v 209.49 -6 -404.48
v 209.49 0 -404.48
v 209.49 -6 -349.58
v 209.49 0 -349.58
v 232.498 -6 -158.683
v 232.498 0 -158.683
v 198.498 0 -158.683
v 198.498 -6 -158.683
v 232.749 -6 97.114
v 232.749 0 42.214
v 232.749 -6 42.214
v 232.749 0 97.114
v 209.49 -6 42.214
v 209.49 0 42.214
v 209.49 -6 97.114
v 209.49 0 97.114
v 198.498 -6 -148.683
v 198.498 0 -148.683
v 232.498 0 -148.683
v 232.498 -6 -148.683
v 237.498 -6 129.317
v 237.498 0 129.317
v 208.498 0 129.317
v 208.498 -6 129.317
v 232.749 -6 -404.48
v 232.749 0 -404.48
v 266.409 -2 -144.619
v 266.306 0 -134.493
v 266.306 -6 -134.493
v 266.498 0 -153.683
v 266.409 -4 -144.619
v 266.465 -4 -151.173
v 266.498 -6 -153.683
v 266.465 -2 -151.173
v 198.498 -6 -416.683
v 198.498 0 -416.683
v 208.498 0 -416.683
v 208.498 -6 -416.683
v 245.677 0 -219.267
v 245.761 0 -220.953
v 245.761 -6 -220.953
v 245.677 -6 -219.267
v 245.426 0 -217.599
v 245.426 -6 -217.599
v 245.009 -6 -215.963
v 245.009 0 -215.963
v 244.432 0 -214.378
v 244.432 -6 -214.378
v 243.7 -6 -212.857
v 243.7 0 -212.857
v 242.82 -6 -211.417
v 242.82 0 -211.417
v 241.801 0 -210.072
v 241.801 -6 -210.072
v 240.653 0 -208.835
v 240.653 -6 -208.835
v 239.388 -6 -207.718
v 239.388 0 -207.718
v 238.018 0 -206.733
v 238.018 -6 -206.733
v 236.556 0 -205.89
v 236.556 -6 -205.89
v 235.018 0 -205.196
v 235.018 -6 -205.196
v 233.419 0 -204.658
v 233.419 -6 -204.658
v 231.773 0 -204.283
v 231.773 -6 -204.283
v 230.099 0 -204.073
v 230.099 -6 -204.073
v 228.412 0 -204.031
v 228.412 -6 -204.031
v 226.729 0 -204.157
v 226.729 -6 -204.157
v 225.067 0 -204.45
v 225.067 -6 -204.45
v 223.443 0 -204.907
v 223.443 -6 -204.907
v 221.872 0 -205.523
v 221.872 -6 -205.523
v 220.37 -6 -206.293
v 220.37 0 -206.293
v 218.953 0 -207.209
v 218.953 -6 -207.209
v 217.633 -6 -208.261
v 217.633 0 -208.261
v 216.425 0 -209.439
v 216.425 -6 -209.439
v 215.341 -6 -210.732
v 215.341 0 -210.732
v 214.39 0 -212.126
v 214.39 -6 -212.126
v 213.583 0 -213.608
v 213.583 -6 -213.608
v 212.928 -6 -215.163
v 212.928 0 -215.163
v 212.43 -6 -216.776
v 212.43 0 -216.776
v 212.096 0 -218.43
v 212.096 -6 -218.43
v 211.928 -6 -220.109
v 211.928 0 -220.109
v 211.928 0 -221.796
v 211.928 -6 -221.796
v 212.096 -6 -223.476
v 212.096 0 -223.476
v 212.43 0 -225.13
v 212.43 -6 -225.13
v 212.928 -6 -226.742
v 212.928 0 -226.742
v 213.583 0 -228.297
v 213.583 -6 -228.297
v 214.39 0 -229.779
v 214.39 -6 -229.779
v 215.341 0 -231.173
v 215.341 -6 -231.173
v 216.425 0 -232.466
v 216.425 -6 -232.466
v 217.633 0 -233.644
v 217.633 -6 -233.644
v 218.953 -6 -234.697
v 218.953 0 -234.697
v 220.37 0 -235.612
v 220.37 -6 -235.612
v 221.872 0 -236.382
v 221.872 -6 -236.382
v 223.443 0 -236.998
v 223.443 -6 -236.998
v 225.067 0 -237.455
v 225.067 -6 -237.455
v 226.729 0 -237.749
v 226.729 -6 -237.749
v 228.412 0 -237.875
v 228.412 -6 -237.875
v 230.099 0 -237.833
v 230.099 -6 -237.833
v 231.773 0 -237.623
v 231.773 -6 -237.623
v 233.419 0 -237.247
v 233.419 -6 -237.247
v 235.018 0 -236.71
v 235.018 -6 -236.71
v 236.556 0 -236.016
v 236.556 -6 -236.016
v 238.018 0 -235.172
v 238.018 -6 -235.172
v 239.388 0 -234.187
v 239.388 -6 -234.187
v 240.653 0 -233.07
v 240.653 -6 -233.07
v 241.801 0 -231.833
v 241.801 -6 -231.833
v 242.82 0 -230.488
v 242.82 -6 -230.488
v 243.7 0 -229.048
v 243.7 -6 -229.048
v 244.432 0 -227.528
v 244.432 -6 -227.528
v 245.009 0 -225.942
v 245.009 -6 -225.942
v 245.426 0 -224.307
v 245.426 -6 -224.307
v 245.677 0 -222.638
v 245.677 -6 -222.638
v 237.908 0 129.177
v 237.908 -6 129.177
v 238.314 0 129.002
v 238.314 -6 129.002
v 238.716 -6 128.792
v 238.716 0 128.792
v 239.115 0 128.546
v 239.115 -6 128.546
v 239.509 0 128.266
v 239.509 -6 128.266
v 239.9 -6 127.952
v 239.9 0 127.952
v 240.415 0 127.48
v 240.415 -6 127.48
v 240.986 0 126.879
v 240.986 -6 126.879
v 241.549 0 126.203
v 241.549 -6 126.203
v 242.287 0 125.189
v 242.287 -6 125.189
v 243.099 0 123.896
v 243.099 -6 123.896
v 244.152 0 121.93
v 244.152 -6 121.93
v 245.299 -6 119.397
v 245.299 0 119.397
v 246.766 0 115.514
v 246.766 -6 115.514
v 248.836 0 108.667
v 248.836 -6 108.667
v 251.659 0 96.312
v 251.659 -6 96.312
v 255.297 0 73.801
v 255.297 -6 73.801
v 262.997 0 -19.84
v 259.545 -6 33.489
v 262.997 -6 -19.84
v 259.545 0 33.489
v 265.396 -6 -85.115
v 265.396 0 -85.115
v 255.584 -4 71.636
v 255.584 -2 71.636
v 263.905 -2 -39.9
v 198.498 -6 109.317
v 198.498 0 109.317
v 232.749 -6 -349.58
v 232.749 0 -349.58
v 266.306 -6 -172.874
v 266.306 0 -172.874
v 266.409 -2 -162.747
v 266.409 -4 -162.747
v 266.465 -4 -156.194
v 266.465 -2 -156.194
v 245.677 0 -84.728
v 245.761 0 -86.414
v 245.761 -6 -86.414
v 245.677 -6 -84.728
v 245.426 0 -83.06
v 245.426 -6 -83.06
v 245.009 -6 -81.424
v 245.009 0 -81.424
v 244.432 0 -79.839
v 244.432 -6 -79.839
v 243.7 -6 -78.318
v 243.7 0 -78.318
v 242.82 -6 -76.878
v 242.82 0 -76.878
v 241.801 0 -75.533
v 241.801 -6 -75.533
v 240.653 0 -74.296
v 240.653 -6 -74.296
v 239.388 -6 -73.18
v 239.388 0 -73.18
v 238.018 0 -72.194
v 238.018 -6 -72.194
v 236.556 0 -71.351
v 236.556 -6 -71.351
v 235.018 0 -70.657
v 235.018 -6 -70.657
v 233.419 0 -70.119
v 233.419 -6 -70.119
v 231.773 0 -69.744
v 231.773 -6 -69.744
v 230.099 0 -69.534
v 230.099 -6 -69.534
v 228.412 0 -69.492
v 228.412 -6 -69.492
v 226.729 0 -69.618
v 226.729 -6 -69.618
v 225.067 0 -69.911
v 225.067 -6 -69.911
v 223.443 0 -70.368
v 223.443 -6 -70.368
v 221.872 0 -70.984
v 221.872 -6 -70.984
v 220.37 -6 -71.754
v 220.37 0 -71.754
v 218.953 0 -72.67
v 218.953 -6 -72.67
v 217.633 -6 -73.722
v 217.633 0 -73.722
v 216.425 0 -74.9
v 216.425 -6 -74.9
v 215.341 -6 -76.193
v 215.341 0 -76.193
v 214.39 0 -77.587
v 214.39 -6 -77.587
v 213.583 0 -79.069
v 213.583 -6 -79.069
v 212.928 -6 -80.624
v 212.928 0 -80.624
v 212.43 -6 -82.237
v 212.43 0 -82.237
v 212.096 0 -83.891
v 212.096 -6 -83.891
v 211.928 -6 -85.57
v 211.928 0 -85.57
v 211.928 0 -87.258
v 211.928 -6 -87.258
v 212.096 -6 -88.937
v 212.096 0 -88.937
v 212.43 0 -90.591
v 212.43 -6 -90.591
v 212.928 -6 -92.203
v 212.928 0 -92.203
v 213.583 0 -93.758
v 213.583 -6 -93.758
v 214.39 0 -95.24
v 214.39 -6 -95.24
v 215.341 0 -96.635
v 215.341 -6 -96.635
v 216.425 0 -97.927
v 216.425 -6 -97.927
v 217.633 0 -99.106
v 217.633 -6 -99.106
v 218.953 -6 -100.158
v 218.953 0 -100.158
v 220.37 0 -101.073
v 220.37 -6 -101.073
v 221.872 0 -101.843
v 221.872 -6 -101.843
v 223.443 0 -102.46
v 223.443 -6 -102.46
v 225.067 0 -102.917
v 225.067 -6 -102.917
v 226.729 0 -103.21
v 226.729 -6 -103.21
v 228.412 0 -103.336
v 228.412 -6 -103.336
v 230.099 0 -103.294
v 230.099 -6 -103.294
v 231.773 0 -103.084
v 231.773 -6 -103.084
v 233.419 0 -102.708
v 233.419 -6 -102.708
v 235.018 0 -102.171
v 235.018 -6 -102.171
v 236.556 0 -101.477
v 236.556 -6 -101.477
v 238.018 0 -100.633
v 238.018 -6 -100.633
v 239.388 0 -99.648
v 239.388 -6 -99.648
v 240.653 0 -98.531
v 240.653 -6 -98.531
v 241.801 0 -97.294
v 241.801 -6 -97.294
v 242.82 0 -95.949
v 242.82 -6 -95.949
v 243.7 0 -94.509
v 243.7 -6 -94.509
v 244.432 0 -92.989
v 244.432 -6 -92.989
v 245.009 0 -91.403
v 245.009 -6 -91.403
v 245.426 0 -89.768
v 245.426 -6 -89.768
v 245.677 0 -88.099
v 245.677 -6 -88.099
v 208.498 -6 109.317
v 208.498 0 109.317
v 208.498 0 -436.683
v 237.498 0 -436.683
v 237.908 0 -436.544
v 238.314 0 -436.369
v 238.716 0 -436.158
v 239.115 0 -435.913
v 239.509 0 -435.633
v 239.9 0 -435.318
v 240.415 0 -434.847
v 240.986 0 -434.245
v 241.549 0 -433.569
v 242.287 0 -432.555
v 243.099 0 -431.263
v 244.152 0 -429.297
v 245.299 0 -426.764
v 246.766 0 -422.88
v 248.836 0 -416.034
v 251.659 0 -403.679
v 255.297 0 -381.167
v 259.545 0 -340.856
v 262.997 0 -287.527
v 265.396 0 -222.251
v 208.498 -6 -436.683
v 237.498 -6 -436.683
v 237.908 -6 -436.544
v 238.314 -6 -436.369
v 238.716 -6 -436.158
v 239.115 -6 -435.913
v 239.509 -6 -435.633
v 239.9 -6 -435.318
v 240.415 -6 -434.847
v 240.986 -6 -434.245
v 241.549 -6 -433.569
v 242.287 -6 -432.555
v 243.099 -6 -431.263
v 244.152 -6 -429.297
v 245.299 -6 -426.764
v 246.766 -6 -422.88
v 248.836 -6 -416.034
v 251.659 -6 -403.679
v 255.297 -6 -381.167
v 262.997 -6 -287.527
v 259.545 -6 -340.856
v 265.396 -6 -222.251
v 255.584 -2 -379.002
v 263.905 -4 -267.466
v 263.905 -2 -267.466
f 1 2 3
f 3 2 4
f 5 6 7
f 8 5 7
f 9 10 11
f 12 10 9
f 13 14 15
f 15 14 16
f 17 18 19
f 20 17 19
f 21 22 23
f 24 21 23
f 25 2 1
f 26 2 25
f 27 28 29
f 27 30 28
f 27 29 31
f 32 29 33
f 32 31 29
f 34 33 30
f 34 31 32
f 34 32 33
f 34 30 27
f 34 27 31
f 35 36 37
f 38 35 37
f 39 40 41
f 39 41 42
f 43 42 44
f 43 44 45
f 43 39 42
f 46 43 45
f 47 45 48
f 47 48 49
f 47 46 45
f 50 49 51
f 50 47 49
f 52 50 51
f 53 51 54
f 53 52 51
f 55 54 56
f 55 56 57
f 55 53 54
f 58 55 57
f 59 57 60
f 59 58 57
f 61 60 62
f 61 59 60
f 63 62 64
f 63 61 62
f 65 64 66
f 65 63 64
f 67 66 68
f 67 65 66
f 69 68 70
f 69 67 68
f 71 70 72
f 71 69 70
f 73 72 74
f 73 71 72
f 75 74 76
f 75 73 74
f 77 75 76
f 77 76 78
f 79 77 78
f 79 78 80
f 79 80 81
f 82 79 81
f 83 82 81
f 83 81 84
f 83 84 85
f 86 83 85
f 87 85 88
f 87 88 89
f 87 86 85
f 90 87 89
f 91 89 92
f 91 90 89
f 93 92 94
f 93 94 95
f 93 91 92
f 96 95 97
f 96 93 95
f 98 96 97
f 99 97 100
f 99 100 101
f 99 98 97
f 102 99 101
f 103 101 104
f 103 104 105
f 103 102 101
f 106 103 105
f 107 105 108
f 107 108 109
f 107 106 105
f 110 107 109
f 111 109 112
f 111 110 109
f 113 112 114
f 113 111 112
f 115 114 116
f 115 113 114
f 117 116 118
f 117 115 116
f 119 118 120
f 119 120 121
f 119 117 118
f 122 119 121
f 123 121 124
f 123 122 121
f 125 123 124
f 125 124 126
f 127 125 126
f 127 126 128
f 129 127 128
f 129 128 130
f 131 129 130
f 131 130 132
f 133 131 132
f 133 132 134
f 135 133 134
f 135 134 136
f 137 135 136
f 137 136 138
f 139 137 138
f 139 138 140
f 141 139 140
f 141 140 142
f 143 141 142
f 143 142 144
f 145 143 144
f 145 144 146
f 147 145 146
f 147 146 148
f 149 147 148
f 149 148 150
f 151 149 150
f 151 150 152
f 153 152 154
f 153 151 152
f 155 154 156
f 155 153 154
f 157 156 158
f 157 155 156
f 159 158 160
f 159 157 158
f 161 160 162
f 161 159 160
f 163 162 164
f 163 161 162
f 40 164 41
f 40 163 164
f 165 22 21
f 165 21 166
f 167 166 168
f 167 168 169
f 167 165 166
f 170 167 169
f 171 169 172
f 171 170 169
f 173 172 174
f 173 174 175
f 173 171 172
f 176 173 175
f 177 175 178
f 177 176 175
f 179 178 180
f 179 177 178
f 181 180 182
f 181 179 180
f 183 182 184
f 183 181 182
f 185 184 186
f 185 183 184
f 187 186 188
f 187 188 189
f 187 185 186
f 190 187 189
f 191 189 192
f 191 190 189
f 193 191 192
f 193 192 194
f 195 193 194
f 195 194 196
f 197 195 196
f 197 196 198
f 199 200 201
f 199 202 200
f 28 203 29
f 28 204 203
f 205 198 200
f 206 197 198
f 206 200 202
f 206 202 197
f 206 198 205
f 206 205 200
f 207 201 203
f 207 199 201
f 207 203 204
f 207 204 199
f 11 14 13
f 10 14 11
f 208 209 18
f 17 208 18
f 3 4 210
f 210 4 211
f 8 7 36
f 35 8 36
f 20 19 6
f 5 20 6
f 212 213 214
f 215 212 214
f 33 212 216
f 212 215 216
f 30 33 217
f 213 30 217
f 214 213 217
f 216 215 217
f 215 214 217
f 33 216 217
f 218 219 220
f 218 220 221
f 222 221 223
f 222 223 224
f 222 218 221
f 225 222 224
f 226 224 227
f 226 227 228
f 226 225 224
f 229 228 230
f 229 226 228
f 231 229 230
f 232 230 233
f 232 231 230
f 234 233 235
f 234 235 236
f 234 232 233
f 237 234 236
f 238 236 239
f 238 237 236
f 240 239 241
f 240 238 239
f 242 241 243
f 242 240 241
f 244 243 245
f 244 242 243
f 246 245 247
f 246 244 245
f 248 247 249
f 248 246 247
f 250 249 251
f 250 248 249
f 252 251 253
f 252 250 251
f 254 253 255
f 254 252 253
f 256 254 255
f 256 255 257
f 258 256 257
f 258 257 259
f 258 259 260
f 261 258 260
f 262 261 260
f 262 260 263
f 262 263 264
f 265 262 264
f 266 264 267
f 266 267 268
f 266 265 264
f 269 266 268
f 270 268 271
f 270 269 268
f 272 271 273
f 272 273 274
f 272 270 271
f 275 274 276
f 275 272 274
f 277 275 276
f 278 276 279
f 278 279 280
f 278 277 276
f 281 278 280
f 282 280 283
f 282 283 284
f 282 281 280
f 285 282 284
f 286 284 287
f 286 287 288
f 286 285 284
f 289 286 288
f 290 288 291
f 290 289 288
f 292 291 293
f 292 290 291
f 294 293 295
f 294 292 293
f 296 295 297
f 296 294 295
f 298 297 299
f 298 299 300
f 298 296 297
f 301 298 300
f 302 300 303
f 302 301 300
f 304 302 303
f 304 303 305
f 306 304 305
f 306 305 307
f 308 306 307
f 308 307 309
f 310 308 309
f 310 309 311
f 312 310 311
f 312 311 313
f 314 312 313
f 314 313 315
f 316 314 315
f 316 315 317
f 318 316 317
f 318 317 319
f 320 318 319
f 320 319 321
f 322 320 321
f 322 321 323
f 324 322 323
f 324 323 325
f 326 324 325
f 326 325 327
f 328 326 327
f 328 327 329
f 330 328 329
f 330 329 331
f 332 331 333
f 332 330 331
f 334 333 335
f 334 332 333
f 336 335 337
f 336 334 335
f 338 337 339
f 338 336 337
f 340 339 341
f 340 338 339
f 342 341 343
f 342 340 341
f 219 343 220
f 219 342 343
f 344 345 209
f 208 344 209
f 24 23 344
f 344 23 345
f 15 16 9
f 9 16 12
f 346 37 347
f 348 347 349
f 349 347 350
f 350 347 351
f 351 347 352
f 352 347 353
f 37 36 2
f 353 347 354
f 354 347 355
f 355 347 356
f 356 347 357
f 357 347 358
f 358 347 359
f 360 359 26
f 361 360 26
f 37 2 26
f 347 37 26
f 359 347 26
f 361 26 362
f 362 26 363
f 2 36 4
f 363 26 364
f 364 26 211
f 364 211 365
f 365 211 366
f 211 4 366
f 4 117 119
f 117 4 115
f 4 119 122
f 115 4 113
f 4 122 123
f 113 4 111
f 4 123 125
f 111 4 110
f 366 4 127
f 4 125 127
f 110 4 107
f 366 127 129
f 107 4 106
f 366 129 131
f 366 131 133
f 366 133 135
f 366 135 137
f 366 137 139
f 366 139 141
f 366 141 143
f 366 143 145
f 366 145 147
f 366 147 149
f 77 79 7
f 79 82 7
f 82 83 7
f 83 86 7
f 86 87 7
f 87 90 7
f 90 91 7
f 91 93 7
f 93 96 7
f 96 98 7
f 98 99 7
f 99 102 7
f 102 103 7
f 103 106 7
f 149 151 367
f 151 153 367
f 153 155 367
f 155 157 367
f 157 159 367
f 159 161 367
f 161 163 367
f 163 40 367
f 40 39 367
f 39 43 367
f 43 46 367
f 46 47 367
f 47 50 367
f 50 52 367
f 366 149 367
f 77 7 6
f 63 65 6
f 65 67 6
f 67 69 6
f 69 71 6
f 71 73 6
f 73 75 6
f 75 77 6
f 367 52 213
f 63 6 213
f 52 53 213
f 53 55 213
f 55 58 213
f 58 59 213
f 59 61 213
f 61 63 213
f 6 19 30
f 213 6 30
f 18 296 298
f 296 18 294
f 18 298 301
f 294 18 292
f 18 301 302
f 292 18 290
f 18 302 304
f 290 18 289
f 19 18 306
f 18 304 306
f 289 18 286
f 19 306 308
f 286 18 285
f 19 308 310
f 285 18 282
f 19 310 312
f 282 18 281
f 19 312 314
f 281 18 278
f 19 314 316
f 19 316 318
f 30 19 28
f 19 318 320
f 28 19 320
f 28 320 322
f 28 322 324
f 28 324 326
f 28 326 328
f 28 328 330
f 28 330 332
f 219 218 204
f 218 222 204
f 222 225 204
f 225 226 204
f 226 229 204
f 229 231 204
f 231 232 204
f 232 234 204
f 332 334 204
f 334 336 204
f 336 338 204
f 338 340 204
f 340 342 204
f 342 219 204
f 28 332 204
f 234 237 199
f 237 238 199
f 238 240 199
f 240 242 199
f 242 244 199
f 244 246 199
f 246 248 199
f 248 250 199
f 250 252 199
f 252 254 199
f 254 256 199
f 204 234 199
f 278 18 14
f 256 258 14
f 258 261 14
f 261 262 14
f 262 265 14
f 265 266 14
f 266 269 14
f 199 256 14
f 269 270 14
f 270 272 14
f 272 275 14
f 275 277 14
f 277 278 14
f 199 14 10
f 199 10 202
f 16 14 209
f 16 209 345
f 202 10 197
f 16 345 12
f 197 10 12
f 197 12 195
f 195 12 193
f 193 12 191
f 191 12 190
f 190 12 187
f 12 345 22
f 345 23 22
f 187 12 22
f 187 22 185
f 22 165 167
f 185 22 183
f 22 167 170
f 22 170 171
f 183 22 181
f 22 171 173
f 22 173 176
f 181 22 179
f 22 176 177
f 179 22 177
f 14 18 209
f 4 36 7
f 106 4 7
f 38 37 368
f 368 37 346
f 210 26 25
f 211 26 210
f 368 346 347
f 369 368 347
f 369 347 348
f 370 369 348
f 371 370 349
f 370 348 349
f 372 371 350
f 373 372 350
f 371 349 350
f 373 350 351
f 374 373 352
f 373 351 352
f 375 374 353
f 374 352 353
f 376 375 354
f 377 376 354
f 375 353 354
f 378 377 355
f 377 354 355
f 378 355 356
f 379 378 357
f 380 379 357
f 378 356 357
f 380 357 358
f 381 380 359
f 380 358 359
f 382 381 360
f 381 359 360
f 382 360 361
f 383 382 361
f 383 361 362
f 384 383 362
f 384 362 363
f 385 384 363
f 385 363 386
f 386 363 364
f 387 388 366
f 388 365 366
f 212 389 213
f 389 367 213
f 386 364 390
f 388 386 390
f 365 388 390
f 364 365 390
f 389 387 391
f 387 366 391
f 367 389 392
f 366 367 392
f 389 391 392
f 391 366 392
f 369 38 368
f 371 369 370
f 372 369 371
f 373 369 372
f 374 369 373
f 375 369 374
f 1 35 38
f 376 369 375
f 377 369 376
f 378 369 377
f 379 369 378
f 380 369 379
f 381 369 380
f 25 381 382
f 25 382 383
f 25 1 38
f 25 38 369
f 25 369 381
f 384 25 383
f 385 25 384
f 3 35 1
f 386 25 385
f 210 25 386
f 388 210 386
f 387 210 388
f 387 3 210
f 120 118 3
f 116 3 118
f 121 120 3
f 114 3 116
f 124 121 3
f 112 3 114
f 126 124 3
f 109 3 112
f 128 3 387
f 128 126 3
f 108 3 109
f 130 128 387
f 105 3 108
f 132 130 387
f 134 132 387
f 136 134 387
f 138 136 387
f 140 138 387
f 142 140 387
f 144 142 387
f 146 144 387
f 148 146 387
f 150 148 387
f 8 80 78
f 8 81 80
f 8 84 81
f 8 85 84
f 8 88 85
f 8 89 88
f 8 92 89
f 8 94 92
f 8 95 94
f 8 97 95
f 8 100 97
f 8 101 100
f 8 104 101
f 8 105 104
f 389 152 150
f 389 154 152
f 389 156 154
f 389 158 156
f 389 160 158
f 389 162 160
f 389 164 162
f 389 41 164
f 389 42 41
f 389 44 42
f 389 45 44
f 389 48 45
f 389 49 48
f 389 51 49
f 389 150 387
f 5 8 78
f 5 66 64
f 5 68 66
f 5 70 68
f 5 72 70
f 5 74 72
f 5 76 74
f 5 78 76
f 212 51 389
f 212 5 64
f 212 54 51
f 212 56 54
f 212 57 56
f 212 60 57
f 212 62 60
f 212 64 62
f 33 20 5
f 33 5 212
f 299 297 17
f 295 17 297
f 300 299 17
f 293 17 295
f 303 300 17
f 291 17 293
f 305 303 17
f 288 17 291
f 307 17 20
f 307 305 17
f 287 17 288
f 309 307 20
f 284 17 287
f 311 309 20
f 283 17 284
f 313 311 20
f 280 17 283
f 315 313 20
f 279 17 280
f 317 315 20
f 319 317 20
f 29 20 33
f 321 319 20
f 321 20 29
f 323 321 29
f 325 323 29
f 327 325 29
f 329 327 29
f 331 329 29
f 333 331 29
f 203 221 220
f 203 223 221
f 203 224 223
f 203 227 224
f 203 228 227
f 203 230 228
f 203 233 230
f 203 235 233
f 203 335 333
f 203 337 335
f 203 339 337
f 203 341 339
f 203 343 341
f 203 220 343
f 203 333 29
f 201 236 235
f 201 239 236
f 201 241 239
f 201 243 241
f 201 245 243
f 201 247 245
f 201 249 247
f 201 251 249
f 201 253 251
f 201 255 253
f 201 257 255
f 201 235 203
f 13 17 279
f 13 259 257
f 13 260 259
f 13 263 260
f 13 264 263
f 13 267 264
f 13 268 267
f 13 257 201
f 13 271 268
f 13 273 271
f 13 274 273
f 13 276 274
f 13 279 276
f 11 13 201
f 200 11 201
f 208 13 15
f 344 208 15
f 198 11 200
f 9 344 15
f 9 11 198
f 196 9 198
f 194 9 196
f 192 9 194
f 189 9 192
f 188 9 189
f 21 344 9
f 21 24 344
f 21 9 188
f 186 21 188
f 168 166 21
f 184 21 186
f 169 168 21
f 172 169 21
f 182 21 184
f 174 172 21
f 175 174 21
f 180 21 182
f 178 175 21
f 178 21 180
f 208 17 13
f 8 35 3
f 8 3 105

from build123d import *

# Parameters (mm, degrees)
F0_W     = 23.2594013214
F0_H     = 54.8999868333
F0_R     = 16.9272487263
F1_DEPTH = 6


# Not quite as in the source:
# - a feature names something its author has since deleted; it is built from what else it names


with BuildPart() as f1:
    # F0 (on Front) → F1 (new body)
    with BuildSketch(Plane.XZ):
        with BuildLine():
            add(Edge.make_bspline(
                [(266.3061527885, -172.8736048774), (266.4418306907, -161.1180388855), (266.4673413702, -154.0153294904), (266.4976486654, -153.6832076827)],
                knots=[239.4581463651, 239.4581463651, 239.4581463651, 239.4581463651, 284.4819853699, 284.4819853699, 284.4819853699, 284.4819853699], degree=3))
            Line((266.4976486654, -153.6832076827), (232.4976486654, -153.6832076827))
            Line((232.4976486654, -153.6832076827), (232.4976486654, -158.6832076827))
            Line((232.4976486654, -158.6832076827), (198.4976486654, -158.6832076827))
            Line((198.4976486654, -158.6832076827), (198.4976486654, -416.6832076827))
            Line((198.4976486654, -416.6832076827), (208.4976486654, -416.6832076827))
            Line((208.4976486654, -416.6832076827), (208.4976486654, -436.6832076827))
            Line((208.4976486654, -436.6832076827), (237.4976486654, -436.6832076827))
            add(Edge.make_bspline(
                [(237.4976486654, -436.6832076827), (261.7467447475, -429.5284690744), (265.5845533054, -235.3952845947), (266.3061527885, -172.8736048774)],
                knots=[0, 0, 0, 0, 239.4581463651, 239.4581463651, 239.4581463651, 239.4581463651], degree=3))
        make_face()
        with Locations((221.1196951035, -377.0302243151)):
            Rectangle(F0_W, F0_H, mode=Mode.SUBTRACT)
        with Locations((228.8340181112, -220.9526370094)):
            Circle(F0_R, mode=Mode.SUBTRACT)
        with BuildLine():
            add(Edge.make_bspline(
                [(237.4976486654, 129.3167923173), (261.7467447475, 122.1620537089), (265.5845533054, -71.9711307708), (266.3061527885, -134.492810488)],
                knots=[0, 0, 0, 0, 239.4581463651, 239.4581463651, 239.4581463651, 239.4581463651], degree=3))
            Line((237.4976486654, 129.3167923173), (208.4976486654, 129.3167923173))
            Line((208.4976486654, 129.3167923173), (208.4976486654, 109.3167923173))
            Line((208.4976486654, 109.3167923173), (198.4976486654, 109.3167923173))
            Line((198.4976486654, 109.3167923173), (198.4976486654, -148.6832076827))
            Line((198.4976486654, -148.6832076827), (232.4976486654, -148.6832076827))
            Line((232.4976486654, -148.6832076827), (232.4976486654, -153.6832076827))
            Line((232.4976486654, -153.6832076827), (266.4976486654, -153.6832076827))
            add(Edge.make_bspline(
                [(266.3061527885, -134.492810488), (266.4418306907, -146.24837648), (266.4673413702, -153.3510858751), (266.4976486654, -153.6832076827)],
                knots=[239.4581463651, 239.4581463651, 239.4581463651, 239.4581463651, 284.4819853699, 284.4819853699, 284.4819853699, 284.4819853699], degree=3))
        make_face()
        with Locations((228.8340181112, -86.4137783561)):
            Circle(F0_R, mode=Mode.SUBTRACT)
        with Locations((221.1196951035, 69.6638089497)):
            Rectangle(F0_W, F0_H, mode=Mode.SUBTRACT)
    extrude(amount=F1_DEPTH)


solid = f1.part
